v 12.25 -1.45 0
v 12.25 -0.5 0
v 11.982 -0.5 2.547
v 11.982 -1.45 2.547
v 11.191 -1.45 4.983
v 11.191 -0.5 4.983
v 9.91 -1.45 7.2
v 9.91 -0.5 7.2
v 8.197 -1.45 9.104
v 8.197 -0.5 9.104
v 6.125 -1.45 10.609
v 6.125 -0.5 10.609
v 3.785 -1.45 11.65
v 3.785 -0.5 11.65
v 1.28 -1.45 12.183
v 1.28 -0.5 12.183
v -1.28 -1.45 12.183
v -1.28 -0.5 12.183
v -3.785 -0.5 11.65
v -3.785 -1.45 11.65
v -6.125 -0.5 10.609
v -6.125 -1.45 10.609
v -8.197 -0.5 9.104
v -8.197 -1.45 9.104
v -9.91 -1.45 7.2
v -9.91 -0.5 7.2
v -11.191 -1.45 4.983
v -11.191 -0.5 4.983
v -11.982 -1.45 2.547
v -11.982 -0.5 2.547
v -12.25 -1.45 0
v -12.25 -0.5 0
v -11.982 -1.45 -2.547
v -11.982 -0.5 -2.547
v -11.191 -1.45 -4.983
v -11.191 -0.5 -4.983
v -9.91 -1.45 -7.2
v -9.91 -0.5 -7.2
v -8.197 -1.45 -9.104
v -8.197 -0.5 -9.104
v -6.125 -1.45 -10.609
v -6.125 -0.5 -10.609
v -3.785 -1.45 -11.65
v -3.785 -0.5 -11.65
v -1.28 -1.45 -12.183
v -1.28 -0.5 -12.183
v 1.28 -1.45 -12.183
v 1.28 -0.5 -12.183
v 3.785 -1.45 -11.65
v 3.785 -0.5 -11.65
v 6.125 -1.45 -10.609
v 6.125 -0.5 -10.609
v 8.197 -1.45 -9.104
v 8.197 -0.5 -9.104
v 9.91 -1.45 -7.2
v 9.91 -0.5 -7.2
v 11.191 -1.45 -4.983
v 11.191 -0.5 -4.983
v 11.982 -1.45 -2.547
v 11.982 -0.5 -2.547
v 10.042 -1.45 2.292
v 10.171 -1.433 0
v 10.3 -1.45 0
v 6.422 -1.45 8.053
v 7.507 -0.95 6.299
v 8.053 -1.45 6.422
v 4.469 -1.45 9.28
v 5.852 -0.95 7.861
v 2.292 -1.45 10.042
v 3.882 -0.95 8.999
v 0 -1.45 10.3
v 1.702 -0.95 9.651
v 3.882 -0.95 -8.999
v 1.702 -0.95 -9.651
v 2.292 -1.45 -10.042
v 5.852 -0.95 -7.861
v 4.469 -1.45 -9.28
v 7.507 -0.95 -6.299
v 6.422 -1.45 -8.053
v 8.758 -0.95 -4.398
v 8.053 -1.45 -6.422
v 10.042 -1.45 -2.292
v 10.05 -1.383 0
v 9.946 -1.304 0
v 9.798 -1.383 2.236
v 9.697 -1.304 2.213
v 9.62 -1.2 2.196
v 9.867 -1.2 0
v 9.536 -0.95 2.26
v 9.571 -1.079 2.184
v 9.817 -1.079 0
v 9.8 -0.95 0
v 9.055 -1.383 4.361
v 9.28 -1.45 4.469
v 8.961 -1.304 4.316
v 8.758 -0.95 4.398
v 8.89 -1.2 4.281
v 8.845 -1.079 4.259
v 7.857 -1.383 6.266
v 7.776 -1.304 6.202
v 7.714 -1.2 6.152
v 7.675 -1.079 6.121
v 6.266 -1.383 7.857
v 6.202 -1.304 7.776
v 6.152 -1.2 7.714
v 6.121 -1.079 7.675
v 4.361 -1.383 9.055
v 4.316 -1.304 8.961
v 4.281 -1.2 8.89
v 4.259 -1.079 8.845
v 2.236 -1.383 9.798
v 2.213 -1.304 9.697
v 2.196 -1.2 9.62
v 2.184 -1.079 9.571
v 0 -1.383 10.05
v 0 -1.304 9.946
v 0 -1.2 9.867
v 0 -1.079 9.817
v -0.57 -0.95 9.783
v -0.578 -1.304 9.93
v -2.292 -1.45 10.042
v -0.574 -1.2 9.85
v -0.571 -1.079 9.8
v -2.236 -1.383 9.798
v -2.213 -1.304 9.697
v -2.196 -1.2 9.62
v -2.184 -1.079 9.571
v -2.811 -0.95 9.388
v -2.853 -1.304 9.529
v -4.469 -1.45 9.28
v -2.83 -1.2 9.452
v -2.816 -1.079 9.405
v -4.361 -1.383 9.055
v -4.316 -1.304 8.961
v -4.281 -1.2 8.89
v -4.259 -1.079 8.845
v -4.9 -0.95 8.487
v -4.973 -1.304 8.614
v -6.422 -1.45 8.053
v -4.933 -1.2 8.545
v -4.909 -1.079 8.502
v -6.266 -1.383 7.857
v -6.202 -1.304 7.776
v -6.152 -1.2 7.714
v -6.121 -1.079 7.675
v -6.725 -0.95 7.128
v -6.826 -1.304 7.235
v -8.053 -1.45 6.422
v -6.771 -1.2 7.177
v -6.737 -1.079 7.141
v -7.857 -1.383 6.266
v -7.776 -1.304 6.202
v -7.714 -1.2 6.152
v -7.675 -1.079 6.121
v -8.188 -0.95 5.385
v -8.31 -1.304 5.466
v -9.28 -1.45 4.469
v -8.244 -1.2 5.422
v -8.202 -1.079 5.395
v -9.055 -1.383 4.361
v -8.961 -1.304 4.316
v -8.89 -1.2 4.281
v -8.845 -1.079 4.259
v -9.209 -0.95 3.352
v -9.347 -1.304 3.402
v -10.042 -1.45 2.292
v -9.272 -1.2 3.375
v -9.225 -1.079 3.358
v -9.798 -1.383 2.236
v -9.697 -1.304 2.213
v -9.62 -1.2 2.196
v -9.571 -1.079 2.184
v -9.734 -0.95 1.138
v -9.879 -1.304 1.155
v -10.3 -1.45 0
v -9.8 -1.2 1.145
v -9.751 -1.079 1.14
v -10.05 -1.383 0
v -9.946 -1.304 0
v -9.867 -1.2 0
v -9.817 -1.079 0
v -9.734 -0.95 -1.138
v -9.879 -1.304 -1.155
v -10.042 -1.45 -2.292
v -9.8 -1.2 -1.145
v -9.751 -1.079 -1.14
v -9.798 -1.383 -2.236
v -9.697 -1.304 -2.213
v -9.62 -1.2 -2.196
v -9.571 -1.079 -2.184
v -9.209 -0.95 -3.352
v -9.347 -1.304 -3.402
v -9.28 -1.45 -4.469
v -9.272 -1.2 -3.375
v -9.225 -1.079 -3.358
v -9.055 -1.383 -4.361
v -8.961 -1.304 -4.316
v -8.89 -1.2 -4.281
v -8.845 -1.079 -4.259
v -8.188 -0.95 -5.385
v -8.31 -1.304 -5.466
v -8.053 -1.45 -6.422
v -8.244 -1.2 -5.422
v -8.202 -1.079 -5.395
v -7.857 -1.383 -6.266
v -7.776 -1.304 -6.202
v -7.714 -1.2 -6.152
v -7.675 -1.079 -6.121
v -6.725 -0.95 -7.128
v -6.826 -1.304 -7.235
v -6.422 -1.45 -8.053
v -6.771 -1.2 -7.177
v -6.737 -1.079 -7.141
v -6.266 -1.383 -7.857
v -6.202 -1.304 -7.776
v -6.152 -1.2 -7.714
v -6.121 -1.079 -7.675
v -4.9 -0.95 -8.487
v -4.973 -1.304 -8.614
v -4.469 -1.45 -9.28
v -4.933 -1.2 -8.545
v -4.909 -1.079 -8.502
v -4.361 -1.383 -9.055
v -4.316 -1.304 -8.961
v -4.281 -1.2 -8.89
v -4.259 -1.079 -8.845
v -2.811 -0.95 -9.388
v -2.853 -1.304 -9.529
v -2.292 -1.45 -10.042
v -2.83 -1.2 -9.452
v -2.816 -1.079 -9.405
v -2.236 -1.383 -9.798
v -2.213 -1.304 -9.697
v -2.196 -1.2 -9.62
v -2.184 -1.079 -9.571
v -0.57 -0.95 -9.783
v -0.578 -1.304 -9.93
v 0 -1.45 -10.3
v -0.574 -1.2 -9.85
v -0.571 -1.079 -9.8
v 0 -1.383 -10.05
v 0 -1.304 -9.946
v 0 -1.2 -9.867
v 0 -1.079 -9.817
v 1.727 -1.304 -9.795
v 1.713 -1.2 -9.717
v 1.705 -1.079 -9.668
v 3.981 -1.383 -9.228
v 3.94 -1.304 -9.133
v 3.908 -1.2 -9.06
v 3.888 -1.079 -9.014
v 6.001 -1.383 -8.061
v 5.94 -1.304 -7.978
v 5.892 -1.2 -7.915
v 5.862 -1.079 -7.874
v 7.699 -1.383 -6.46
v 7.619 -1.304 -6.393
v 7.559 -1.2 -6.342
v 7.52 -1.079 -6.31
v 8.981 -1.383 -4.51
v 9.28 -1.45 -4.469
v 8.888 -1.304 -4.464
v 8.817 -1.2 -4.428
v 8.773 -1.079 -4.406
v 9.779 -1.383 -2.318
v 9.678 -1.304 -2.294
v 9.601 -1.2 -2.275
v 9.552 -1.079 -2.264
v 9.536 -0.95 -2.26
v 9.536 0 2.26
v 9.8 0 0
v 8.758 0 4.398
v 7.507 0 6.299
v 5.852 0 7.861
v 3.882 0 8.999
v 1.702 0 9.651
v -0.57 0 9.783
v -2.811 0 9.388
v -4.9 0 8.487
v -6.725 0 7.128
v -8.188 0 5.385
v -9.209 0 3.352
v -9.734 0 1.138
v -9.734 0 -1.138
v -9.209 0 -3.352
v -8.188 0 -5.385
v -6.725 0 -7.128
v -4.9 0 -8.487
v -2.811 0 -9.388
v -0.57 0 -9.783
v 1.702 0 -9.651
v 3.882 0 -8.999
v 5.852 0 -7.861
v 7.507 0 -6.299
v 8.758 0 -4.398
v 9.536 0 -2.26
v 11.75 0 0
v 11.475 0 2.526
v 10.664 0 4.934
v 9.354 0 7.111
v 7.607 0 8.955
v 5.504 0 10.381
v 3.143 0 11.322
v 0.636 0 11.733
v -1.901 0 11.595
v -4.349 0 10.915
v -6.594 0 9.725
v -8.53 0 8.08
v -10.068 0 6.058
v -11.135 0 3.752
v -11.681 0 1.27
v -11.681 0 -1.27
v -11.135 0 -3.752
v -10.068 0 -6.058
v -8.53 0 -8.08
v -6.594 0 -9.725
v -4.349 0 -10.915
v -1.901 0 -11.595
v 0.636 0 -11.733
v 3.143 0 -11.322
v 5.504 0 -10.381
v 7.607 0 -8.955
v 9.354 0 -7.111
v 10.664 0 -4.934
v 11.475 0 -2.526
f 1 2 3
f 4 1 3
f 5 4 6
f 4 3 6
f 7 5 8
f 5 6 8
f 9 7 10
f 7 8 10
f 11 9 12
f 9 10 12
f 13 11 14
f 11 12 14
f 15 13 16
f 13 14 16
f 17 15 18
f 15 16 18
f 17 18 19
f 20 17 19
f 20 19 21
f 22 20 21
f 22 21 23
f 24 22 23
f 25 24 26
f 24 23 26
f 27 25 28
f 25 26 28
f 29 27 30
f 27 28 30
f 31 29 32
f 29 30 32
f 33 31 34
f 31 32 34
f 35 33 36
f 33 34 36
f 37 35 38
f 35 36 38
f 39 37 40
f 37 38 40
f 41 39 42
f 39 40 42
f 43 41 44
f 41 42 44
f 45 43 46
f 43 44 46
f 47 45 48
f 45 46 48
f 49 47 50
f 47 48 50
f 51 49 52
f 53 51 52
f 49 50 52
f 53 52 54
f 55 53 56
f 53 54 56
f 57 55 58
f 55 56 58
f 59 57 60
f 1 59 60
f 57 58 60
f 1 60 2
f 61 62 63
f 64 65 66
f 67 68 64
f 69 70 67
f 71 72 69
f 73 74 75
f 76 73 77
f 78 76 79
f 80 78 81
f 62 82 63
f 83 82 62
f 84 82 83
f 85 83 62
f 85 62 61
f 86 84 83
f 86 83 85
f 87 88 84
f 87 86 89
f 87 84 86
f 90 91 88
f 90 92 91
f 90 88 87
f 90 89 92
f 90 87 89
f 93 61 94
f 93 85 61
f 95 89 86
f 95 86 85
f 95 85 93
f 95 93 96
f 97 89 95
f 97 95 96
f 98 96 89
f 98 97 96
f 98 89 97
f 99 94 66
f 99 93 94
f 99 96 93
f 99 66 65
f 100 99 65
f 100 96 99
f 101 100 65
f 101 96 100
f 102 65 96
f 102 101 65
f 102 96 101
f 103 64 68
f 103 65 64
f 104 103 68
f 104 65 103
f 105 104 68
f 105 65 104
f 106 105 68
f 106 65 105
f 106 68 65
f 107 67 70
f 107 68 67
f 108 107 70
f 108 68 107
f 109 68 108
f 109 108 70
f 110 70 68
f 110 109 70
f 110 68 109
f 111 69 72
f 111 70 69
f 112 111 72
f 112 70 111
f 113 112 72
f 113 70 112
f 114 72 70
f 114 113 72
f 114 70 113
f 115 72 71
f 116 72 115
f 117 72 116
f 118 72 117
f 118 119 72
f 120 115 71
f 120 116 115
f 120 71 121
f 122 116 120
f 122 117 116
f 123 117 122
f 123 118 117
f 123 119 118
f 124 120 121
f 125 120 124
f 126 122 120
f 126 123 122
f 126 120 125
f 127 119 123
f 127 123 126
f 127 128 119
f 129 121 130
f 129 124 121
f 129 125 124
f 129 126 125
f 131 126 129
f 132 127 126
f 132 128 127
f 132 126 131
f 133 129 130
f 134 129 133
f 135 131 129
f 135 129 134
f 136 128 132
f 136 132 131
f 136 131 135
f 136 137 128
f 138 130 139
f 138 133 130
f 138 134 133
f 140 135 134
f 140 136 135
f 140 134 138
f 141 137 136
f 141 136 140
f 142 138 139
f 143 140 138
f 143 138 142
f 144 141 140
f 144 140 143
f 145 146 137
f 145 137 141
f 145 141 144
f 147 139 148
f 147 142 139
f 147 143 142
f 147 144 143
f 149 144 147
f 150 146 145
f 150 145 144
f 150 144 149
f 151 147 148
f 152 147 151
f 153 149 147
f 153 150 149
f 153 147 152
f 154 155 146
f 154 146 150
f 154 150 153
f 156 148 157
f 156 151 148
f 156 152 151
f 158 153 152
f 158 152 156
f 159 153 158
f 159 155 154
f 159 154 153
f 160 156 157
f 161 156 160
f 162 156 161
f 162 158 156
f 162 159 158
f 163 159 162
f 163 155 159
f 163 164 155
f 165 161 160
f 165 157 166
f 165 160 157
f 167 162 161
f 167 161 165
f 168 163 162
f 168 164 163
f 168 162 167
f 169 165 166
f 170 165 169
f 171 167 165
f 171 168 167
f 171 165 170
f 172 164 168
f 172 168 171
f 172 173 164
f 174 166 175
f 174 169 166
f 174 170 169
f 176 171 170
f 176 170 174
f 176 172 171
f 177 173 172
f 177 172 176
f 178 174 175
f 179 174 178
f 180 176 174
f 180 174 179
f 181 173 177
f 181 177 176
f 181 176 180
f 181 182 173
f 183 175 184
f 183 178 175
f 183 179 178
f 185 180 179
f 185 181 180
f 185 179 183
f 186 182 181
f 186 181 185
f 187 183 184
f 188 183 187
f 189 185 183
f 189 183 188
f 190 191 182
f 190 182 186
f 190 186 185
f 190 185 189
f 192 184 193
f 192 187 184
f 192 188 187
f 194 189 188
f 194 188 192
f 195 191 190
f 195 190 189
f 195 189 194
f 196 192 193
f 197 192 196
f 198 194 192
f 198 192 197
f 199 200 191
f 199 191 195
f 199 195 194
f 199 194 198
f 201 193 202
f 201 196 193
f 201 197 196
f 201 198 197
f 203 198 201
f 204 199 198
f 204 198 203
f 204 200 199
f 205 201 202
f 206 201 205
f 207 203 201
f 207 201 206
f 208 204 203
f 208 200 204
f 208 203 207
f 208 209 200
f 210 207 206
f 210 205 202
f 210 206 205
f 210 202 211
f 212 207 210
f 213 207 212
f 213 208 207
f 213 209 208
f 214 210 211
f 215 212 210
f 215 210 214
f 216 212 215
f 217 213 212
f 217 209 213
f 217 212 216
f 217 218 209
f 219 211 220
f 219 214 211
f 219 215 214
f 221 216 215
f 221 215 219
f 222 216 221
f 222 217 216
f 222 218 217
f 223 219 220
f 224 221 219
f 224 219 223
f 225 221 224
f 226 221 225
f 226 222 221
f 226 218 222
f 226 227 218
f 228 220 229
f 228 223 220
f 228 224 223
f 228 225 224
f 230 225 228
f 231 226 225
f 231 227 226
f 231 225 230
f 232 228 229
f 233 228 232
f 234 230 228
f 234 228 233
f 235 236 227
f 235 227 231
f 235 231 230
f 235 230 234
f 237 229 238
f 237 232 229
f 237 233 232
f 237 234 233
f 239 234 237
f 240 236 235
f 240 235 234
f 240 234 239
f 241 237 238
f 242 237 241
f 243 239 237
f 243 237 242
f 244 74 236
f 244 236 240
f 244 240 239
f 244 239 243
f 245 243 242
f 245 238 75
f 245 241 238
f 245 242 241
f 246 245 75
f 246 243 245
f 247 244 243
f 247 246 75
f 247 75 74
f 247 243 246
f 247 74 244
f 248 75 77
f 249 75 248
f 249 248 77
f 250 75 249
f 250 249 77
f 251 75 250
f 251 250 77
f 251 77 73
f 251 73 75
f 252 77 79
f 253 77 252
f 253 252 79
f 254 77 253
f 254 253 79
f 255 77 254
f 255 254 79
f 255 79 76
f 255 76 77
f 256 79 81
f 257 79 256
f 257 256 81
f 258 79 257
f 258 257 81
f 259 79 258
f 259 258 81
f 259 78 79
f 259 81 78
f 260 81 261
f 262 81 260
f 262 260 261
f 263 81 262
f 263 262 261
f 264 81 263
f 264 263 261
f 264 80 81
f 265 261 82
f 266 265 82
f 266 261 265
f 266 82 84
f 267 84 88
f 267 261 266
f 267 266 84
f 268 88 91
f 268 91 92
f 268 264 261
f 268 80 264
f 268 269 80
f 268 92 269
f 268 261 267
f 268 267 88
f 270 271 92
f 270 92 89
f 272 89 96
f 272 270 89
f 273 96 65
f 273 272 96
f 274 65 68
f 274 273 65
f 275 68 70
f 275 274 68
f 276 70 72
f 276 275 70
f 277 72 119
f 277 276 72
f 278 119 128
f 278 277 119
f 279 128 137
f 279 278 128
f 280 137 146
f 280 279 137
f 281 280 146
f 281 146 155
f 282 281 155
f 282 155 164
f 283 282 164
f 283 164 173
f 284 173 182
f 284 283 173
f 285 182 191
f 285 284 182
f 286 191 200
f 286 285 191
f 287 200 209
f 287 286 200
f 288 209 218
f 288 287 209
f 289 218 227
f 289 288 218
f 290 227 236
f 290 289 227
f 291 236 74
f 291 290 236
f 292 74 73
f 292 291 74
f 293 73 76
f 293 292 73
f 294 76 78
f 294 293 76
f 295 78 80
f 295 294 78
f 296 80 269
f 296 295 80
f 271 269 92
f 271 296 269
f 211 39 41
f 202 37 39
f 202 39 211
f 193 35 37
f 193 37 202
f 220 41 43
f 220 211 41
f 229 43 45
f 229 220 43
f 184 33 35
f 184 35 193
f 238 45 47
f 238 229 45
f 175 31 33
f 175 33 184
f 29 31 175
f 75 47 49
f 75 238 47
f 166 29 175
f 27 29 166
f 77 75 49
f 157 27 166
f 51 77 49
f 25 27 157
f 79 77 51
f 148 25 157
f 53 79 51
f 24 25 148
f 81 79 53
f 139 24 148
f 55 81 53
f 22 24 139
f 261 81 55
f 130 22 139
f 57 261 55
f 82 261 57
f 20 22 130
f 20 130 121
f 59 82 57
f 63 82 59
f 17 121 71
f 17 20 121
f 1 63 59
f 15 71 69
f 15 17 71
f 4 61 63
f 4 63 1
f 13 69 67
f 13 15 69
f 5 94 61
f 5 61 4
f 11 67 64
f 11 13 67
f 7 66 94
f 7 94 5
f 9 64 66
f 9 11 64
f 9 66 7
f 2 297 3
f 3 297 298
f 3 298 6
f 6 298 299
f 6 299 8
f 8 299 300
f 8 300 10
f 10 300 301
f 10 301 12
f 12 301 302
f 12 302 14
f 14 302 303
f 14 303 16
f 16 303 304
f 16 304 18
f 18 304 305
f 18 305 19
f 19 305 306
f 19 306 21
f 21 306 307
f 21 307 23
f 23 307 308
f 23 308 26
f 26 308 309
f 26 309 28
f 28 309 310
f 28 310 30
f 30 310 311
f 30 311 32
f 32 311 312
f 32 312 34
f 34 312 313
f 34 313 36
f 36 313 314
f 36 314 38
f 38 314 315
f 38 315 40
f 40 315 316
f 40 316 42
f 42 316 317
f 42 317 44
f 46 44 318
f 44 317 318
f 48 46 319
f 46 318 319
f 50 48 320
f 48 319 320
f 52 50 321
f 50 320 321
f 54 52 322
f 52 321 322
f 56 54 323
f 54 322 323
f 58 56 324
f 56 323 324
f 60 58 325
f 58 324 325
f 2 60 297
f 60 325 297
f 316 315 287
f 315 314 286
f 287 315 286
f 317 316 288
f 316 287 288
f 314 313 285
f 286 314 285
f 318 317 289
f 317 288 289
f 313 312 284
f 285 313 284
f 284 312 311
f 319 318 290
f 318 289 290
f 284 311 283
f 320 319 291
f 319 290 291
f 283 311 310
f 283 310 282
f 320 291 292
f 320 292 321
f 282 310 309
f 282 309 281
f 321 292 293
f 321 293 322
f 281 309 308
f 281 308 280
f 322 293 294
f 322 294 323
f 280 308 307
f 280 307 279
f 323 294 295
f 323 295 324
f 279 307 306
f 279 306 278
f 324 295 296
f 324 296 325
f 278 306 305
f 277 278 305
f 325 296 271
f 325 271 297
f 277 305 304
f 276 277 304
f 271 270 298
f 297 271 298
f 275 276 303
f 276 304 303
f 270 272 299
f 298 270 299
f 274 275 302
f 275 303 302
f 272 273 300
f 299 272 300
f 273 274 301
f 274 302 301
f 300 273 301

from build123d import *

# Parameters (mm, degrees)
F0_R     = 12.25
F0_R_2   = 9.8
F1_DEPTH = 1.45
F2_SIZE  = 0.5
F3_R     = 0.5


with BuildPart() as f1:
    # F0 (on Front) → F1 (new body)
    with BuildSketch(Plane.XZ):
        Circle(F0_R)
        Circle(F0_R_2, mode=Mode.SUBTRACT)
    extrude(amount=F1_DEPTH)

    # F2
    f2_edges = [f1.edges().sort_by_distance(p)[0] for p in [
        (-12.25, 0, 0),
    ]]
    chamfer(f2_edges, length=F2_SIZE)

    # F3
    f3_edges = [f1.edges().sort_by_distance(p)[0] for p in [
        (-9.8, -1.45, 0),
    ]]
    fillet(f3_edges, radius=F3_R)


solid = f1.part
